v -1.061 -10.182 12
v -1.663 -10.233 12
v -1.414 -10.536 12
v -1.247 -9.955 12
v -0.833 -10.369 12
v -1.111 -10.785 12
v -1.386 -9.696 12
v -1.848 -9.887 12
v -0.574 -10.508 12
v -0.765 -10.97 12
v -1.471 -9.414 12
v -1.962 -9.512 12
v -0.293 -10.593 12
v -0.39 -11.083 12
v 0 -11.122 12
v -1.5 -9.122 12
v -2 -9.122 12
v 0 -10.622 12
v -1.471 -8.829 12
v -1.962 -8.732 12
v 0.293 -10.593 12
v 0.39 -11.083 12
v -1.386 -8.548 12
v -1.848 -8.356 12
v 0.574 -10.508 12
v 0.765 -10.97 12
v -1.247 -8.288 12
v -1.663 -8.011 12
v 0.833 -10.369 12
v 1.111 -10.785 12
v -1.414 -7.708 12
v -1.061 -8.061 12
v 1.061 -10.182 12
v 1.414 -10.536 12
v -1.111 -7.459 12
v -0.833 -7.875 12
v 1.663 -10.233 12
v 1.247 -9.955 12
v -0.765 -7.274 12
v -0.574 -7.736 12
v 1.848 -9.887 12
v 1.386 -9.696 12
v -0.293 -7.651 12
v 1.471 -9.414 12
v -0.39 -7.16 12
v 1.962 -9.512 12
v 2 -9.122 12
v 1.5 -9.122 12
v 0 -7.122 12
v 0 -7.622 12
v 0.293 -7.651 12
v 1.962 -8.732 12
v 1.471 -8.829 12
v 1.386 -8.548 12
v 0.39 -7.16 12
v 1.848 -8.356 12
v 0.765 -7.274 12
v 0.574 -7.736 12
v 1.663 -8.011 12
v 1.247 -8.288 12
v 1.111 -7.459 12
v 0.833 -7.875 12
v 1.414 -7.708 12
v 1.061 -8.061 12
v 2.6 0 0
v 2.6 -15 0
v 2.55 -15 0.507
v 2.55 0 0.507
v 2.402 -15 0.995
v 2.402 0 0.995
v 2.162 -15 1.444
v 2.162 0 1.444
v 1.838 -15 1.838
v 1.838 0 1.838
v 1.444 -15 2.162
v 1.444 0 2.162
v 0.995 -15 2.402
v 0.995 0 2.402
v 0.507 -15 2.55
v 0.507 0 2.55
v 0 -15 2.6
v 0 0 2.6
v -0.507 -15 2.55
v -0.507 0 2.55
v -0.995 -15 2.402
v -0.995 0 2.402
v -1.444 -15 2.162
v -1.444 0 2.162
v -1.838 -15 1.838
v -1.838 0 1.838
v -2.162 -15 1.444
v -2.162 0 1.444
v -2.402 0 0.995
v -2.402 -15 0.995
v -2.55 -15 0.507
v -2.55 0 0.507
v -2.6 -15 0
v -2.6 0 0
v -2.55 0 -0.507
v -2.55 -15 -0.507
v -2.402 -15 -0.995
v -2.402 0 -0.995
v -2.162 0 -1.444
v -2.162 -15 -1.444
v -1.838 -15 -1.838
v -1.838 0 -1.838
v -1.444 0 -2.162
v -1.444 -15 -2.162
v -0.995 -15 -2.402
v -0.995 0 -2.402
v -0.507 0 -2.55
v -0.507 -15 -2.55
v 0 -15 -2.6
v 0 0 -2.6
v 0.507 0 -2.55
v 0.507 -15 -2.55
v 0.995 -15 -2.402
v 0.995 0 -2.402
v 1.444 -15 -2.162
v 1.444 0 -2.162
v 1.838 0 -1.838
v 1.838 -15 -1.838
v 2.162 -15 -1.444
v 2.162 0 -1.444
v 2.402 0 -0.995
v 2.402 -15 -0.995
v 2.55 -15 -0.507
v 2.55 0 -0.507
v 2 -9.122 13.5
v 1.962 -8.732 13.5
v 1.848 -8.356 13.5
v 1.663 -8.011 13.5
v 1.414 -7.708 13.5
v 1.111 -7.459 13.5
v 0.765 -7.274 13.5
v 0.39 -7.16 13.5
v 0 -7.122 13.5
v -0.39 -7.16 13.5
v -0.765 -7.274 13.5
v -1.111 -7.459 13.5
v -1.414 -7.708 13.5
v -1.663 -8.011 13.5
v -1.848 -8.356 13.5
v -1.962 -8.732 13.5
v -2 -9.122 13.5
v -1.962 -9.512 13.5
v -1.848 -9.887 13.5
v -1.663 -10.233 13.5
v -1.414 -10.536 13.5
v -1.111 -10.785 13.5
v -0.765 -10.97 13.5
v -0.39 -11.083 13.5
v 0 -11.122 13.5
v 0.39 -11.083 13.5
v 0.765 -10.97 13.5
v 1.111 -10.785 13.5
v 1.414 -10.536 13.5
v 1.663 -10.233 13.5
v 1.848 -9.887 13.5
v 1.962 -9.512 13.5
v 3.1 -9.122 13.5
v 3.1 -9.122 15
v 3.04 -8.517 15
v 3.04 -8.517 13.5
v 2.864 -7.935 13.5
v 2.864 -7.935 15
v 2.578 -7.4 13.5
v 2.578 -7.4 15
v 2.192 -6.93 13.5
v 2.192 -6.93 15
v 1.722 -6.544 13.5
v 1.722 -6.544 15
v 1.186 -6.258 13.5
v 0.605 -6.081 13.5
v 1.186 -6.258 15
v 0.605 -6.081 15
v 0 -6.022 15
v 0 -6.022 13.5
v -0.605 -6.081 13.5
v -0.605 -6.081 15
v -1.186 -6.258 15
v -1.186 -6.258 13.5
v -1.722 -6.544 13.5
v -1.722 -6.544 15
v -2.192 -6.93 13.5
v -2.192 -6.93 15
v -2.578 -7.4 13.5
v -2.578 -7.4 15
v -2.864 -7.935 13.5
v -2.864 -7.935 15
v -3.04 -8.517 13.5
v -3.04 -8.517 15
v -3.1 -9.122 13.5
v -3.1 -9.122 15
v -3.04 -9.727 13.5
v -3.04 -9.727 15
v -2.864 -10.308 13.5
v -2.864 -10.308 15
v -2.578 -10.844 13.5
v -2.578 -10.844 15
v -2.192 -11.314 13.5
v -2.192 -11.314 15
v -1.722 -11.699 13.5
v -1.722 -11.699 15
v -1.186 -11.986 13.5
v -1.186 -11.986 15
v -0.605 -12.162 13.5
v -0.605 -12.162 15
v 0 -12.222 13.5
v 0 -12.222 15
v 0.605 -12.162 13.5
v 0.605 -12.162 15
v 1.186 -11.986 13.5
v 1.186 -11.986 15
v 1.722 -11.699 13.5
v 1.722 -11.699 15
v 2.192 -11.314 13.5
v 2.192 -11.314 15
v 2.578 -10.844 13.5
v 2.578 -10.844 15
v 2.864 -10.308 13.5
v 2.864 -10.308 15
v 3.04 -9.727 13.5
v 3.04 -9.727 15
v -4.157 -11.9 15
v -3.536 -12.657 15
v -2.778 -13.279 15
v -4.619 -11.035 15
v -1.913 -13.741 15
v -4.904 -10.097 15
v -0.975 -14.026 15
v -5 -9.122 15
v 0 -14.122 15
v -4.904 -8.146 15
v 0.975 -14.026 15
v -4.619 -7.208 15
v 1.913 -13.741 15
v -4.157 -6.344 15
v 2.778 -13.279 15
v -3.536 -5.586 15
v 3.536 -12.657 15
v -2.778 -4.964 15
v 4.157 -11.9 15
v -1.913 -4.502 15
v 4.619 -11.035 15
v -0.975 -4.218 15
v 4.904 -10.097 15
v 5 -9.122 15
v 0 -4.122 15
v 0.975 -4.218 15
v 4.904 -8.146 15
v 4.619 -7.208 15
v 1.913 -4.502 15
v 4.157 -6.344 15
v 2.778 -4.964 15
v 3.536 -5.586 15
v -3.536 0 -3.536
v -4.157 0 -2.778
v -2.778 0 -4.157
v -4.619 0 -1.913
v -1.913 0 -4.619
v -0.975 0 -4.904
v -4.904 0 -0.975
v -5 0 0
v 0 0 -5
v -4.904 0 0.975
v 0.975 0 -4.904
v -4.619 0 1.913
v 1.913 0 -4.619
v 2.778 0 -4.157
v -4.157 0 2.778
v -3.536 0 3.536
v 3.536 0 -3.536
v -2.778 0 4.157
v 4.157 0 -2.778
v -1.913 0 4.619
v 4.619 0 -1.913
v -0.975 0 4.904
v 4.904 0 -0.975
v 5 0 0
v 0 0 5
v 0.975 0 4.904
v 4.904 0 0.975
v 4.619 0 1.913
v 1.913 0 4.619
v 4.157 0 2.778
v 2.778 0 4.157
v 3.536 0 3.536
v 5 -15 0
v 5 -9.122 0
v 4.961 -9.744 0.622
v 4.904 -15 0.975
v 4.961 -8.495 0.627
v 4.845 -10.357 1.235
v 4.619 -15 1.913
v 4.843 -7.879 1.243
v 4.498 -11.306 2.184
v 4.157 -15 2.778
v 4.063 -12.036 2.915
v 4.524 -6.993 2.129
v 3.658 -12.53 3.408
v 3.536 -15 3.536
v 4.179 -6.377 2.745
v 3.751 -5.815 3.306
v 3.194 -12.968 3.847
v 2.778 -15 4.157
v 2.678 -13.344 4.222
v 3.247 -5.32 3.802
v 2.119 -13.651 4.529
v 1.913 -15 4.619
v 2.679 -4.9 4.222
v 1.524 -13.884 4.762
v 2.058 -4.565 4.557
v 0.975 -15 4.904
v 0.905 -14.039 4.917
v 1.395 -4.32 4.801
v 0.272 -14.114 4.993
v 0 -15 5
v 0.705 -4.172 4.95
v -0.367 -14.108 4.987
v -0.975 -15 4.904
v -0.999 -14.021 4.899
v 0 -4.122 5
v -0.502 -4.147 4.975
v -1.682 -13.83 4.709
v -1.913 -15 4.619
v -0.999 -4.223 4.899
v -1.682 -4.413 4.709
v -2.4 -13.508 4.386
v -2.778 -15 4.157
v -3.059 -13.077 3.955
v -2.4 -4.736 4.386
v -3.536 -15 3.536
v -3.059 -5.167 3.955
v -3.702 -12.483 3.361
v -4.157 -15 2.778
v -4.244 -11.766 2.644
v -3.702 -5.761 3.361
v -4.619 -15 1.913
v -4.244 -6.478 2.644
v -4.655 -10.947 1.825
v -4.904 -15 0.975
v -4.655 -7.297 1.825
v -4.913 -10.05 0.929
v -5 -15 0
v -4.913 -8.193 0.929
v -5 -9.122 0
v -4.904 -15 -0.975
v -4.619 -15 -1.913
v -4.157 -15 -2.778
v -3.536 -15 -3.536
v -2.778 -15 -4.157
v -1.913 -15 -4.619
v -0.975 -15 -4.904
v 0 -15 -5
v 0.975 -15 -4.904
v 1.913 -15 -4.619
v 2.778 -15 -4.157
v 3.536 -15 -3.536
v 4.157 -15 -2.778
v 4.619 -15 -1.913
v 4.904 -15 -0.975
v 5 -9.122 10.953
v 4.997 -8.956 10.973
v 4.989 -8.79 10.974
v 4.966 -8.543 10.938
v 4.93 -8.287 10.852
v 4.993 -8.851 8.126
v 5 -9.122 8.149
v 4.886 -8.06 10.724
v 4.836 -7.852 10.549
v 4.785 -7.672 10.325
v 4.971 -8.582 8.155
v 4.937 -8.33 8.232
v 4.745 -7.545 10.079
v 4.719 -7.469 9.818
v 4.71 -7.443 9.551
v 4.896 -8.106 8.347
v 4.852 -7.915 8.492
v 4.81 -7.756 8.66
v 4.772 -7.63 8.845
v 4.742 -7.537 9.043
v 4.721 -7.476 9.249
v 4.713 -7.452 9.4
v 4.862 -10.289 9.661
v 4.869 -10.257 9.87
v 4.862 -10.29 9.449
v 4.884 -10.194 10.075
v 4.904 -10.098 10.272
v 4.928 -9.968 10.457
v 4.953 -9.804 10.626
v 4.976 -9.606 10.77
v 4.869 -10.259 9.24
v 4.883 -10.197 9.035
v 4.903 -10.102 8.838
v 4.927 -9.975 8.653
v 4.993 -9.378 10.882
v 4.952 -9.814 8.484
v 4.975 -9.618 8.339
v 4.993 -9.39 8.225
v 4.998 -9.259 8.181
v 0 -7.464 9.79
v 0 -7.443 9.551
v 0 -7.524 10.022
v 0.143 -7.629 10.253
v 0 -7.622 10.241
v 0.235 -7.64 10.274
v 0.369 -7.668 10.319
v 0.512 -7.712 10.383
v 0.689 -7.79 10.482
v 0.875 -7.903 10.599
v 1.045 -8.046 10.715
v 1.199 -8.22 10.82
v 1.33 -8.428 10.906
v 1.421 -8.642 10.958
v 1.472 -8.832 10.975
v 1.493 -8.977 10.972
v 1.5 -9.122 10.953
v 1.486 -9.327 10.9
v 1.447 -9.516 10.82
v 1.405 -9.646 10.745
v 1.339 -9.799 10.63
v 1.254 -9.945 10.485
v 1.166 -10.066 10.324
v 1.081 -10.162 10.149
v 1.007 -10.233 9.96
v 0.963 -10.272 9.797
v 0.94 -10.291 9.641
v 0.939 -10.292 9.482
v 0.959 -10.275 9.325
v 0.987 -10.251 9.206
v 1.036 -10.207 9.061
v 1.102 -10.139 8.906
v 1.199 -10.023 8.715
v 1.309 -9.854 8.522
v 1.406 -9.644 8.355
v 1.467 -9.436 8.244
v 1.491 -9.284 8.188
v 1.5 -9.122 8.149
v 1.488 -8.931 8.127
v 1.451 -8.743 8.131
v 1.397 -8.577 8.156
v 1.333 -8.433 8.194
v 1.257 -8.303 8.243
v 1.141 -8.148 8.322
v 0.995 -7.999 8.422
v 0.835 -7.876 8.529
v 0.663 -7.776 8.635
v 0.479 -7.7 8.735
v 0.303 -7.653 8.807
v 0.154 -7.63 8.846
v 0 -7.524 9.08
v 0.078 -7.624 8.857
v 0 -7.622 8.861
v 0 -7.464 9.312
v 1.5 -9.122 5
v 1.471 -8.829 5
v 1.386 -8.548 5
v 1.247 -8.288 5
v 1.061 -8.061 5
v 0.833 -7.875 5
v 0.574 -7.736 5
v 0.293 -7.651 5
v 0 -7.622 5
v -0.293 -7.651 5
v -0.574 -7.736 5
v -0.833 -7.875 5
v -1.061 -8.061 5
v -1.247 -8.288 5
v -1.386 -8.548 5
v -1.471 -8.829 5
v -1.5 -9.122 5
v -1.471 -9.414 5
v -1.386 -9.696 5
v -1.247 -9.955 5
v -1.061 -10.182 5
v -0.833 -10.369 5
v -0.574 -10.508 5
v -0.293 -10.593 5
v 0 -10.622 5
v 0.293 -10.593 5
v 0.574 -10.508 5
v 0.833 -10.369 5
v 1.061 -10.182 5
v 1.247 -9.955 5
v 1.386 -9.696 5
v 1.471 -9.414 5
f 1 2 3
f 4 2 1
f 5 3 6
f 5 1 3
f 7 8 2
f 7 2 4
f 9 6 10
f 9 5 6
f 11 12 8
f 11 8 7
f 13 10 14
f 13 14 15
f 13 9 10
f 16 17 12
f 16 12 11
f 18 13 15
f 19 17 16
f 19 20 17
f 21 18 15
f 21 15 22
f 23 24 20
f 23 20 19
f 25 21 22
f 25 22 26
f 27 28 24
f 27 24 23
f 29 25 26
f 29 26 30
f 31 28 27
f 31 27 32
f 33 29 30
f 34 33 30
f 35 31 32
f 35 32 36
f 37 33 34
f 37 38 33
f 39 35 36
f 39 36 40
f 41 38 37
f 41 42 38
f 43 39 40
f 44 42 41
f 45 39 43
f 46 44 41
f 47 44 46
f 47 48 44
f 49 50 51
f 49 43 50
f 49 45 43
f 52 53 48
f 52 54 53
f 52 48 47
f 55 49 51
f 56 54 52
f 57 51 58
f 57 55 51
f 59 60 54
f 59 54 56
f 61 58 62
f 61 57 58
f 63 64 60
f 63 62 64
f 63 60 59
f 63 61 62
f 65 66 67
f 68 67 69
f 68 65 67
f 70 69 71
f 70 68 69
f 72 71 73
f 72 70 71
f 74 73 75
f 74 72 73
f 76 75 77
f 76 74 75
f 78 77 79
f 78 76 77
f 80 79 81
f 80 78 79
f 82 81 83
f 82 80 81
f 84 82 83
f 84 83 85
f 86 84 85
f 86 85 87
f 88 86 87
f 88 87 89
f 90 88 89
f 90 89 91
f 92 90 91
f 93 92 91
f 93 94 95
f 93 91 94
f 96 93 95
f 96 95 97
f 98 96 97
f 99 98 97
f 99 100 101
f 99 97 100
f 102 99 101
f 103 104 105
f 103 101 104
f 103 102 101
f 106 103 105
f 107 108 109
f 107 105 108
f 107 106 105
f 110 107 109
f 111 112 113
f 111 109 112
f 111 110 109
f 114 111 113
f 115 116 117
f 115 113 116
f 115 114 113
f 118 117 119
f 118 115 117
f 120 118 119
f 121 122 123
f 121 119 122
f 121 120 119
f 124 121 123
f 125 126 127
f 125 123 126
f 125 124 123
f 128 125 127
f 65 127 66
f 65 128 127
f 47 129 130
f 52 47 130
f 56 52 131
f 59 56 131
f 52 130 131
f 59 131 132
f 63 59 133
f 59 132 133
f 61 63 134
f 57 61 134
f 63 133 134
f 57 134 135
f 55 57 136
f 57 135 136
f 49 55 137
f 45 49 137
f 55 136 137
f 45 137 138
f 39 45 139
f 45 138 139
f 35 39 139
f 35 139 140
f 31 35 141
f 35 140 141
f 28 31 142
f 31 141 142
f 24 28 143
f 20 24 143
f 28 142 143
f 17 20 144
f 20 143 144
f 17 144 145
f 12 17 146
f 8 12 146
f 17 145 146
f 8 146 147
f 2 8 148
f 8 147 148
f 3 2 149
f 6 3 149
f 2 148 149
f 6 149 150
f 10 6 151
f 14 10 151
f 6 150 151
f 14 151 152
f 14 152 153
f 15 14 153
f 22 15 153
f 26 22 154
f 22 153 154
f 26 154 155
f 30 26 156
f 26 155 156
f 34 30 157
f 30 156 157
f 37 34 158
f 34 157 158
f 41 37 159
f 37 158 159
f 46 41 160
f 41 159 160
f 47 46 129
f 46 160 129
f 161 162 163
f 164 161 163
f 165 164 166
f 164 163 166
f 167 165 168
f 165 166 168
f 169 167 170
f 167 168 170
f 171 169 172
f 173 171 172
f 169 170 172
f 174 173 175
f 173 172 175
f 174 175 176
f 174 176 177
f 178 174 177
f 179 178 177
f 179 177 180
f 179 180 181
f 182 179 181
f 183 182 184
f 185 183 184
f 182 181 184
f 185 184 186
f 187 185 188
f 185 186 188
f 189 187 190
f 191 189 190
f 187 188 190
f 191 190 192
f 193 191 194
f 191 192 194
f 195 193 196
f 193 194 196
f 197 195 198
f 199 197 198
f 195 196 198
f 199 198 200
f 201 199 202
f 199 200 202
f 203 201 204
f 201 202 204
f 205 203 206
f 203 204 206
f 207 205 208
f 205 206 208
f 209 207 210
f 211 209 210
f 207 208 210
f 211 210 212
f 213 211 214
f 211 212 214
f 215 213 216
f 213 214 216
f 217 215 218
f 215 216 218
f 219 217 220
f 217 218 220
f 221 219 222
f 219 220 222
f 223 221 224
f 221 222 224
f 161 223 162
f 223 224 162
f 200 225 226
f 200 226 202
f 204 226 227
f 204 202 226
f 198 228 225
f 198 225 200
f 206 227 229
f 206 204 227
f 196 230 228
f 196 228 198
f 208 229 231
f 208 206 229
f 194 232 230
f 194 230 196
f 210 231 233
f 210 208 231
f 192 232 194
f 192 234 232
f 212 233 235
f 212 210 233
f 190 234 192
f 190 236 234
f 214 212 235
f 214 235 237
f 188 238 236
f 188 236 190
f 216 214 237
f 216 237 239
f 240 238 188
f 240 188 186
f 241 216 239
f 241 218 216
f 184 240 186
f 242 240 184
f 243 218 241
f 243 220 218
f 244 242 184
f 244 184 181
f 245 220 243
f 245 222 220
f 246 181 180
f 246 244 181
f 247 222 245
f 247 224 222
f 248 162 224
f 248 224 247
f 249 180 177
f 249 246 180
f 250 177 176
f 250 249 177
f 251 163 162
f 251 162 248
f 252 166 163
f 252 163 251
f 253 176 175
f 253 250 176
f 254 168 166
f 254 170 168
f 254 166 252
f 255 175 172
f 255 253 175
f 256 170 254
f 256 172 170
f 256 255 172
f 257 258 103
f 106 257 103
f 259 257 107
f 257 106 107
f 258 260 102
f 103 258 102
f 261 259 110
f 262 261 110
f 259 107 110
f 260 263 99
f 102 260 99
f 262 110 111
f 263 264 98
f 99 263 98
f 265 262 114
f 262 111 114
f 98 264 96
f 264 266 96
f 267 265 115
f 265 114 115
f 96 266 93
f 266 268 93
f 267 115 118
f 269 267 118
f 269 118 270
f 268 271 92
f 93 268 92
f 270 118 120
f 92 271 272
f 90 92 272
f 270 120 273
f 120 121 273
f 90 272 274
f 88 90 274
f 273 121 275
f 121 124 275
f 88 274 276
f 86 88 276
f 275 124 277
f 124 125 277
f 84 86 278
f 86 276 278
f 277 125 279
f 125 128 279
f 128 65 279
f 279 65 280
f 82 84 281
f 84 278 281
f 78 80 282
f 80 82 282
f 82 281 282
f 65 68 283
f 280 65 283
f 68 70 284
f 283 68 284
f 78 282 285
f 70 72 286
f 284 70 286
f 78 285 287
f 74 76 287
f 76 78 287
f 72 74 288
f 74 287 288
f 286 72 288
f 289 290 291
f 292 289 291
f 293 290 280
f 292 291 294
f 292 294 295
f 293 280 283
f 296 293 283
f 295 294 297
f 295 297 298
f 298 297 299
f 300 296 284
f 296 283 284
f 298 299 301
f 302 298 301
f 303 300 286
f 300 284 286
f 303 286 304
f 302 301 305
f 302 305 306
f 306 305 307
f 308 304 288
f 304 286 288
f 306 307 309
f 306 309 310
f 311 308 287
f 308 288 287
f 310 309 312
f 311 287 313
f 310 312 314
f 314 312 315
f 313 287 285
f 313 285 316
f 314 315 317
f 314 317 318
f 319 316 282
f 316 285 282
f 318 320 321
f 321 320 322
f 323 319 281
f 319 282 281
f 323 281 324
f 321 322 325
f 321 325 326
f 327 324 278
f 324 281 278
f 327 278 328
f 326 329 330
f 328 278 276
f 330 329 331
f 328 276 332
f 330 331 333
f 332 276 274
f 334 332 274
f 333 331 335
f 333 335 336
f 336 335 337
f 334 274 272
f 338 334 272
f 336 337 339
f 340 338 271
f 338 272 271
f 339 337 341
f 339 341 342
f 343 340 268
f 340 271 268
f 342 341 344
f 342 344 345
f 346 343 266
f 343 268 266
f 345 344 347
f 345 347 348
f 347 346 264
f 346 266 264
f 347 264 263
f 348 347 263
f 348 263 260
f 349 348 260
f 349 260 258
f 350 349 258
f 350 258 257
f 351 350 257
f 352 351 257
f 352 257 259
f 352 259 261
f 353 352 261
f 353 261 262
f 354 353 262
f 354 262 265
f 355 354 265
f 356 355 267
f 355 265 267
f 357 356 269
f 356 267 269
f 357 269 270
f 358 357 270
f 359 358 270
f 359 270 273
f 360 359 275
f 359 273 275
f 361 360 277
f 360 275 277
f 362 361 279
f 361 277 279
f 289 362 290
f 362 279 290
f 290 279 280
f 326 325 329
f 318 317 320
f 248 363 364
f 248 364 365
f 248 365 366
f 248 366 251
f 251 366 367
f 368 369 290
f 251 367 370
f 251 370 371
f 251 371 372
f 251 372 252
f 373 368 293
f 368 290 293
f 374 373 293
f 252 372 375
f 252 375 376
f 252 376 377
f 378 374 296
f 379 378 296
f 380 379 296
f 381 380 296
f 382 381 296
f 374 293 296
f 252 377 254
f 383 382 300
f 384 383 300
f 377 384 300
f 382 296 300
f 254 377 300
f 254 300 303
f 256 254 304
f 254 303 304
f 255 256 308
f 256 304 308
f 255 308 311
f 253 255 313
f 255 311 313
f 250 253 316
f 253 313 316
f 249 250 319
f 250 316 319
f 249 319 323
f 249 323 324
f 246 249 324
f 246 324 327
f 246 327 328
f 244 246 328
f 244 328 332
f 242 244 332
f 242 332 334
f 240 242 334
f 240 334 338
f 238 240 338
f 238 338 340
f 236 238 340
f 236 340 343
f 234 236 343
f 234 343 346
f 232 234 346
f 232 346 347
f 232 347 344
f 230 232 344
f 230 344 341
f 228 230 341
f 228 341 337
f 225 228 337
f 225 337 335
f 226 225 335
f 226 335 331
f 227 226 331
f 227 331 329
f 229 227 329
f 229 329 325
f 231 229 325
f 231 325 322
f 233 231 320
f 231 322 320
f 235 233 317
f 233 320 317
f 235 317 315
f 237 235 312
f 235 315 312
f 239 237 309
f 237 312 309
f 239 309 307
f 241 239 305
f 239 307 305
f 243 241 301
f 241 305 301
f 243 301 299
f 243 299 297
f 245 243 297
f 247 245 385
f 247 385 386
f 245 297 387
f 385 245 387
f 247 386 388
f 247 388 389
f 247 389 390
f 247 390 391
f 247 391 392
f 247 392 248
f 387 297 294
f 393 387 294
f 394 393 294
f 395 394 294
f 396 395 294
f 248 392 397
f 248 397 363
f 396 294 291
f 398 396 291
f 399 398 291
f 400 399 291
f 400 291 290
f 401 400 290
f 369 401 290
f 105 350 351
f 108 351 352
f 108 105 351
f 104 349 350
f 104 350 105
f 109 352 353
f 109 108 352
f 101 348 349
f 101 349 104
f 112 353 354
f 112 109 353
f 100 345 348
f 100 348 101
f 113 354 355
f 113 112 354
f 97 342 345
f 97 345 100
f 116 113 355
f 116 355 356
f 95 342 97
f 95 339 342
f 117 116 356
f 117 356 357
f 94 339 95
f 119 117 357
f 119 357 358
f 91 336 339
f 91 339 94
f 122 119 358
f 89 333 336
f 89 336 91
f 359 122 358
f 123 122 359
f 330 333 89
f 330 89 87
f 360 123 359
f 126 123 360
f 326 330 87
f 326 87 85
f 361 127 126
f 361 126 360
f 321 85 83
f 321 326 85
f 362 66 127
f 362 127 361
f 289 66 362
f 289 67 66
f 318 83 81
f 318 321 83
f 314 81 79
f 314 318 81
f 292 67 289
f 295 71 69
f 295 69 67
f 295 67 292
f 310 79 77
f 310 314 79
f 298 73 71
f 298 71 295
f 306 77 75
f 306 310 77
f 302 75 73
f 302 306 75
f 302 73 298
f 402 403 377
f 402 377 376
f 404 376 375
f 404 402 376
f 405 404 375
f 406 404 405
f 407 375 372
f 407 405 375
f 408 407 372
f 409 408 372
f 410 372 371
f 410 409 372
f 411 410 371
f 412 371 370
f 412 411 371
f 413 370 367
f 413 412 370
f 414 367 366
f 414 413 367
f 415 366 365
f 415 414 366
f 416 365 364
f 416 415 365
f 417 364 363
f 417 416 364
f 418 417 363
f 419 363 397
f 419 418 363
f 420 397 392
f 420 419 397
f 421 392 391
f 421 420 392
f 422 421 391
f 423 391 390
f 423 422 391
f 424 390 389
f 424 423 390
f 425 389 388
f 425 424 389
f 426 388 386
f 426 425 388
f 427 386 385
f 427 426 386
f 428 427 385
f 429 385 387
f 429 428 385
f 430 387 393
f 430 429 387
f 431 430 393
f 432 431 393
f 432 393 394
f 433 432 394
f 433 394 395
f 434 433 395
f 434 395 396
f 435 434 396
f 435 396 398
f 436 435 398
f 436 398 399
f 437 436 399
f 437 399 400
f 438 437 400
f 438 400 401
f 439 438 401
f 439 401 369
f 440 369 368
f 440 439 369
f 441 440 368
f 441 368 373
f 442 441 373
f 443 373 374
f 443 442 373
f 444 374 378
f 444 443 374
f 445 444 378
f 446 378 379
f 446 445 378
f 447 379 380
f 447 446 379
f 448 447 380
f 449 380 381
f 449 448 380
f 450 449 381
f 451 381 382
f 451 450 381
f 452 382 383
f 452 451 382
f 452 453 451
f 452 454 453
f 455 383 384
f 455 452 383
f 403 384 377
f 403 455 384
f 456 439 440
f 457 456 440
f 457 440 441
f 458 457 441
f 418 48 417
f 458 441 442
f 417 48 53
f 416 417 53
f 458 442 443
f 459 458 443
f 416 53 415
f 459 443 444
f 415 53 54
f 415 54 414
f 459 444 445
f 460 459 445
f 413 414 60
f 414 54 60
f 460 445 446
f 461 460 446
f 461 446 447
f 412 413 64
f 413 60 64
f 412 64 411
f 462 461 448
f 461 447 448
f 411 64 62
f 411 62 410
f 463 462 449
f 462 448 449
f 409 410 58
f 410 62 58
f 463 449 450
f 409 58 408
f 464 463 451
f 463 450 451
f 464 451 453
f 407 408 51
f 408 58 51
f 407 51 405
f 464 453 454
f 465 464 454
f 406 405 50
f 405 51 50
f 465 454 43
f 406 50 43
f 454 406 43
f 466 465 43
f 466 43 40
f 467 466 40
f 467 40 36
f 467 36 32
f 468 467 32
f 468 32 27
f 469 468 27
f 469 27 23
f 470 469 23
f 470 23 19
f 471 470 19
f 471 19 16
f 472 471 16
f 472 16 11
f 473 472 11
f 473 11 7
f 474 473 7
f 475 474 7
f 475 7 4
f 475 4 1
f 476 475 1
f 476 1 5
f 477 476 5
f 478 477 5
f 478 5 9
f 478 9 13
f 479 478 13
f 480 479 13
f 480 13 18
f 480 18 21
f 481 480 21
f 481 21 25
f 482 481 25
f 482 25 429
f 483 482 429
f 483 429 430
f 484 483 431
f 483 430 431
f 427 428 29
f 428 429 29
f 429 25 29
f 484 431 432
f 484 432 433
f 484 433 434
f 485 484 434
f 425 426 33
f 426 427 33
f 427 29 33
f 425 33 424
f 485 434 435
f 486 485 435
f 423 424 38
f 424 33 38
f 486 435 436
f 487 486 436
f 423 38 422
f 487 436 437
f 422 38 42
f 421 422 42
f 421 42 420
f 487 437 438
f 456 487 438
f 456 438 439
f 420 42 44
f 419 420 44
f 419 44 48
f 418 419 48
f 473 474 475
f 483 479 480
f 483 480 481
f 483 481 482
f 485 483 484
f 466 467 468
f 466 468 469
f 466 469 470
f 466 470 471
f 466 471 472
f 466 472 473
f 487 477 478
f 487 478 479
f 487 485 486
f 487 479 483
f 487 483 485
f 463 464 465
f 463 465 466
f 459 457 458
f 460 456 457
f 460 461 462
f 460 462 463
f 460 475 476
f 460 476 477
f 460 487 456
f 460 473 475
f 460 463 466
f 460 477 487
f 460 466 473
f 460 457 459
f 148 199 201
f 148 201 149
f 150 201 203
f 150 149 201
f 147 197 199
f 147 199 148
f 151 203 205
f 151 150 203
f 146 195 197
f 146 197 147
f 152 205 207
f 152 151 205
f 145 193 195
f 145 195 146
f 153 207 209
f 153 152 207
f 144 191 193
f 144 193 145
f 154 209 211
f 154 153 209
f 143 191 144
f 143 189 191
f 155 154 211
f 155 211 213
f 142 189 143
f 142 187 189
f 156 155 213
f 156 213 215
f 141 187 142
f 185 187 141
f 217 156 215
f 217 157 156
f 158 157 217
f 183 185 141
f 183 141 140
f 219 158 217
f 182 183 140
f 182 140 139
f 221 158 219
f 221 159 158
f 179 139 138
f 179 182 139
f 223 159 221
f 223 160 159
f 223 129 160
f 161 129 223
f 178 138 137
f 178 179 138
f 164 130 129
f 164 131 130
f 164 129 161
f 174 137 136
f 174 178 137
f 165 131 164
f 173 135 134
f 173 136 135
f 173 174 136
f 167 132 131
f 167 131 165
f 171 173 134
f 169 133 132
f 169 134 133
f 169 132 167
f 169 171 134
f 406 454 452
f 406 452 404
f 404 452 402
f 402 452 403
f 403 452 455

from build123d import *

# Parameters (mm, degrees)
F0_R      = 5
F1_DEPTH  = 15
F2_R      = 5
F4_DEPTH  = 15
F3_R      = 2.6
F5_DEPTH  = 25
F6_R      = 1.5
F7_DEPTH  = 10
F8_R      = 3.1
F9_DEPTH  = 1.5
F10_R     = 1.425
F11_DEPTH = 25
F12_R     = 2
F13_DEPTH = 1.5


with BuildPart() as f1:
    # F0 (on Front) → F1 (new body)
    with BuildSketch(Plane.XZ):
        Circle(F0_R)
    extrude(amount=F1_DEPTH)

    # F2 (on Top) → F4 (join)
    with BuildSketch(Plane.XY):
        with Locations((0, -9.121813)):
            Circle(F2_R)
    extrude(amount=F4_DEPTH)

    # F3 (on Front) → F5 (cut)
    with BuildSketch(Plane.XZ):
        Circle(F3_R)
    extrude(amount=F5_DEPTH, mode=Mode.SUBTRACT)

    # F6 (on face) → F7 (cut)
    with BuildSketch(Plane.XY.offset(15)):
        with Locations((0, -9.121813)):
            Circle(F6_R)
    extrude(amount=-F7_DEPTH, mode=Mode.SUBTRACT)

    # F8 (on face) → F9 (cut)
    with BuildSketch(Plane.XY.offset(15)):
        with Locations((0, -9.121813)):
            Circle(F8_R)
    extrude(amount=-F9_DEPTH, mode=Mode.SUBTRACT)

    # F10 (on Right) → F11 (cut)
    with BuildSketch(Plane.YZ):
        with Locations((-8.868461, 9.550918)):
            Circle(F10_R)
    extrude(amount=F11_DEPTH, mode=Mode.SUBTRACT)

    # F12 (on face) → F13 (cut)
    with BuildSketch(Plane.XY.offset(13.5)):
        with Locations((0, -9.121813)):
            Circle(F12_R)
    extrude(amount=-F13_DEPTH, mode=Mode.SUBTRACT)


solid = f1.part
